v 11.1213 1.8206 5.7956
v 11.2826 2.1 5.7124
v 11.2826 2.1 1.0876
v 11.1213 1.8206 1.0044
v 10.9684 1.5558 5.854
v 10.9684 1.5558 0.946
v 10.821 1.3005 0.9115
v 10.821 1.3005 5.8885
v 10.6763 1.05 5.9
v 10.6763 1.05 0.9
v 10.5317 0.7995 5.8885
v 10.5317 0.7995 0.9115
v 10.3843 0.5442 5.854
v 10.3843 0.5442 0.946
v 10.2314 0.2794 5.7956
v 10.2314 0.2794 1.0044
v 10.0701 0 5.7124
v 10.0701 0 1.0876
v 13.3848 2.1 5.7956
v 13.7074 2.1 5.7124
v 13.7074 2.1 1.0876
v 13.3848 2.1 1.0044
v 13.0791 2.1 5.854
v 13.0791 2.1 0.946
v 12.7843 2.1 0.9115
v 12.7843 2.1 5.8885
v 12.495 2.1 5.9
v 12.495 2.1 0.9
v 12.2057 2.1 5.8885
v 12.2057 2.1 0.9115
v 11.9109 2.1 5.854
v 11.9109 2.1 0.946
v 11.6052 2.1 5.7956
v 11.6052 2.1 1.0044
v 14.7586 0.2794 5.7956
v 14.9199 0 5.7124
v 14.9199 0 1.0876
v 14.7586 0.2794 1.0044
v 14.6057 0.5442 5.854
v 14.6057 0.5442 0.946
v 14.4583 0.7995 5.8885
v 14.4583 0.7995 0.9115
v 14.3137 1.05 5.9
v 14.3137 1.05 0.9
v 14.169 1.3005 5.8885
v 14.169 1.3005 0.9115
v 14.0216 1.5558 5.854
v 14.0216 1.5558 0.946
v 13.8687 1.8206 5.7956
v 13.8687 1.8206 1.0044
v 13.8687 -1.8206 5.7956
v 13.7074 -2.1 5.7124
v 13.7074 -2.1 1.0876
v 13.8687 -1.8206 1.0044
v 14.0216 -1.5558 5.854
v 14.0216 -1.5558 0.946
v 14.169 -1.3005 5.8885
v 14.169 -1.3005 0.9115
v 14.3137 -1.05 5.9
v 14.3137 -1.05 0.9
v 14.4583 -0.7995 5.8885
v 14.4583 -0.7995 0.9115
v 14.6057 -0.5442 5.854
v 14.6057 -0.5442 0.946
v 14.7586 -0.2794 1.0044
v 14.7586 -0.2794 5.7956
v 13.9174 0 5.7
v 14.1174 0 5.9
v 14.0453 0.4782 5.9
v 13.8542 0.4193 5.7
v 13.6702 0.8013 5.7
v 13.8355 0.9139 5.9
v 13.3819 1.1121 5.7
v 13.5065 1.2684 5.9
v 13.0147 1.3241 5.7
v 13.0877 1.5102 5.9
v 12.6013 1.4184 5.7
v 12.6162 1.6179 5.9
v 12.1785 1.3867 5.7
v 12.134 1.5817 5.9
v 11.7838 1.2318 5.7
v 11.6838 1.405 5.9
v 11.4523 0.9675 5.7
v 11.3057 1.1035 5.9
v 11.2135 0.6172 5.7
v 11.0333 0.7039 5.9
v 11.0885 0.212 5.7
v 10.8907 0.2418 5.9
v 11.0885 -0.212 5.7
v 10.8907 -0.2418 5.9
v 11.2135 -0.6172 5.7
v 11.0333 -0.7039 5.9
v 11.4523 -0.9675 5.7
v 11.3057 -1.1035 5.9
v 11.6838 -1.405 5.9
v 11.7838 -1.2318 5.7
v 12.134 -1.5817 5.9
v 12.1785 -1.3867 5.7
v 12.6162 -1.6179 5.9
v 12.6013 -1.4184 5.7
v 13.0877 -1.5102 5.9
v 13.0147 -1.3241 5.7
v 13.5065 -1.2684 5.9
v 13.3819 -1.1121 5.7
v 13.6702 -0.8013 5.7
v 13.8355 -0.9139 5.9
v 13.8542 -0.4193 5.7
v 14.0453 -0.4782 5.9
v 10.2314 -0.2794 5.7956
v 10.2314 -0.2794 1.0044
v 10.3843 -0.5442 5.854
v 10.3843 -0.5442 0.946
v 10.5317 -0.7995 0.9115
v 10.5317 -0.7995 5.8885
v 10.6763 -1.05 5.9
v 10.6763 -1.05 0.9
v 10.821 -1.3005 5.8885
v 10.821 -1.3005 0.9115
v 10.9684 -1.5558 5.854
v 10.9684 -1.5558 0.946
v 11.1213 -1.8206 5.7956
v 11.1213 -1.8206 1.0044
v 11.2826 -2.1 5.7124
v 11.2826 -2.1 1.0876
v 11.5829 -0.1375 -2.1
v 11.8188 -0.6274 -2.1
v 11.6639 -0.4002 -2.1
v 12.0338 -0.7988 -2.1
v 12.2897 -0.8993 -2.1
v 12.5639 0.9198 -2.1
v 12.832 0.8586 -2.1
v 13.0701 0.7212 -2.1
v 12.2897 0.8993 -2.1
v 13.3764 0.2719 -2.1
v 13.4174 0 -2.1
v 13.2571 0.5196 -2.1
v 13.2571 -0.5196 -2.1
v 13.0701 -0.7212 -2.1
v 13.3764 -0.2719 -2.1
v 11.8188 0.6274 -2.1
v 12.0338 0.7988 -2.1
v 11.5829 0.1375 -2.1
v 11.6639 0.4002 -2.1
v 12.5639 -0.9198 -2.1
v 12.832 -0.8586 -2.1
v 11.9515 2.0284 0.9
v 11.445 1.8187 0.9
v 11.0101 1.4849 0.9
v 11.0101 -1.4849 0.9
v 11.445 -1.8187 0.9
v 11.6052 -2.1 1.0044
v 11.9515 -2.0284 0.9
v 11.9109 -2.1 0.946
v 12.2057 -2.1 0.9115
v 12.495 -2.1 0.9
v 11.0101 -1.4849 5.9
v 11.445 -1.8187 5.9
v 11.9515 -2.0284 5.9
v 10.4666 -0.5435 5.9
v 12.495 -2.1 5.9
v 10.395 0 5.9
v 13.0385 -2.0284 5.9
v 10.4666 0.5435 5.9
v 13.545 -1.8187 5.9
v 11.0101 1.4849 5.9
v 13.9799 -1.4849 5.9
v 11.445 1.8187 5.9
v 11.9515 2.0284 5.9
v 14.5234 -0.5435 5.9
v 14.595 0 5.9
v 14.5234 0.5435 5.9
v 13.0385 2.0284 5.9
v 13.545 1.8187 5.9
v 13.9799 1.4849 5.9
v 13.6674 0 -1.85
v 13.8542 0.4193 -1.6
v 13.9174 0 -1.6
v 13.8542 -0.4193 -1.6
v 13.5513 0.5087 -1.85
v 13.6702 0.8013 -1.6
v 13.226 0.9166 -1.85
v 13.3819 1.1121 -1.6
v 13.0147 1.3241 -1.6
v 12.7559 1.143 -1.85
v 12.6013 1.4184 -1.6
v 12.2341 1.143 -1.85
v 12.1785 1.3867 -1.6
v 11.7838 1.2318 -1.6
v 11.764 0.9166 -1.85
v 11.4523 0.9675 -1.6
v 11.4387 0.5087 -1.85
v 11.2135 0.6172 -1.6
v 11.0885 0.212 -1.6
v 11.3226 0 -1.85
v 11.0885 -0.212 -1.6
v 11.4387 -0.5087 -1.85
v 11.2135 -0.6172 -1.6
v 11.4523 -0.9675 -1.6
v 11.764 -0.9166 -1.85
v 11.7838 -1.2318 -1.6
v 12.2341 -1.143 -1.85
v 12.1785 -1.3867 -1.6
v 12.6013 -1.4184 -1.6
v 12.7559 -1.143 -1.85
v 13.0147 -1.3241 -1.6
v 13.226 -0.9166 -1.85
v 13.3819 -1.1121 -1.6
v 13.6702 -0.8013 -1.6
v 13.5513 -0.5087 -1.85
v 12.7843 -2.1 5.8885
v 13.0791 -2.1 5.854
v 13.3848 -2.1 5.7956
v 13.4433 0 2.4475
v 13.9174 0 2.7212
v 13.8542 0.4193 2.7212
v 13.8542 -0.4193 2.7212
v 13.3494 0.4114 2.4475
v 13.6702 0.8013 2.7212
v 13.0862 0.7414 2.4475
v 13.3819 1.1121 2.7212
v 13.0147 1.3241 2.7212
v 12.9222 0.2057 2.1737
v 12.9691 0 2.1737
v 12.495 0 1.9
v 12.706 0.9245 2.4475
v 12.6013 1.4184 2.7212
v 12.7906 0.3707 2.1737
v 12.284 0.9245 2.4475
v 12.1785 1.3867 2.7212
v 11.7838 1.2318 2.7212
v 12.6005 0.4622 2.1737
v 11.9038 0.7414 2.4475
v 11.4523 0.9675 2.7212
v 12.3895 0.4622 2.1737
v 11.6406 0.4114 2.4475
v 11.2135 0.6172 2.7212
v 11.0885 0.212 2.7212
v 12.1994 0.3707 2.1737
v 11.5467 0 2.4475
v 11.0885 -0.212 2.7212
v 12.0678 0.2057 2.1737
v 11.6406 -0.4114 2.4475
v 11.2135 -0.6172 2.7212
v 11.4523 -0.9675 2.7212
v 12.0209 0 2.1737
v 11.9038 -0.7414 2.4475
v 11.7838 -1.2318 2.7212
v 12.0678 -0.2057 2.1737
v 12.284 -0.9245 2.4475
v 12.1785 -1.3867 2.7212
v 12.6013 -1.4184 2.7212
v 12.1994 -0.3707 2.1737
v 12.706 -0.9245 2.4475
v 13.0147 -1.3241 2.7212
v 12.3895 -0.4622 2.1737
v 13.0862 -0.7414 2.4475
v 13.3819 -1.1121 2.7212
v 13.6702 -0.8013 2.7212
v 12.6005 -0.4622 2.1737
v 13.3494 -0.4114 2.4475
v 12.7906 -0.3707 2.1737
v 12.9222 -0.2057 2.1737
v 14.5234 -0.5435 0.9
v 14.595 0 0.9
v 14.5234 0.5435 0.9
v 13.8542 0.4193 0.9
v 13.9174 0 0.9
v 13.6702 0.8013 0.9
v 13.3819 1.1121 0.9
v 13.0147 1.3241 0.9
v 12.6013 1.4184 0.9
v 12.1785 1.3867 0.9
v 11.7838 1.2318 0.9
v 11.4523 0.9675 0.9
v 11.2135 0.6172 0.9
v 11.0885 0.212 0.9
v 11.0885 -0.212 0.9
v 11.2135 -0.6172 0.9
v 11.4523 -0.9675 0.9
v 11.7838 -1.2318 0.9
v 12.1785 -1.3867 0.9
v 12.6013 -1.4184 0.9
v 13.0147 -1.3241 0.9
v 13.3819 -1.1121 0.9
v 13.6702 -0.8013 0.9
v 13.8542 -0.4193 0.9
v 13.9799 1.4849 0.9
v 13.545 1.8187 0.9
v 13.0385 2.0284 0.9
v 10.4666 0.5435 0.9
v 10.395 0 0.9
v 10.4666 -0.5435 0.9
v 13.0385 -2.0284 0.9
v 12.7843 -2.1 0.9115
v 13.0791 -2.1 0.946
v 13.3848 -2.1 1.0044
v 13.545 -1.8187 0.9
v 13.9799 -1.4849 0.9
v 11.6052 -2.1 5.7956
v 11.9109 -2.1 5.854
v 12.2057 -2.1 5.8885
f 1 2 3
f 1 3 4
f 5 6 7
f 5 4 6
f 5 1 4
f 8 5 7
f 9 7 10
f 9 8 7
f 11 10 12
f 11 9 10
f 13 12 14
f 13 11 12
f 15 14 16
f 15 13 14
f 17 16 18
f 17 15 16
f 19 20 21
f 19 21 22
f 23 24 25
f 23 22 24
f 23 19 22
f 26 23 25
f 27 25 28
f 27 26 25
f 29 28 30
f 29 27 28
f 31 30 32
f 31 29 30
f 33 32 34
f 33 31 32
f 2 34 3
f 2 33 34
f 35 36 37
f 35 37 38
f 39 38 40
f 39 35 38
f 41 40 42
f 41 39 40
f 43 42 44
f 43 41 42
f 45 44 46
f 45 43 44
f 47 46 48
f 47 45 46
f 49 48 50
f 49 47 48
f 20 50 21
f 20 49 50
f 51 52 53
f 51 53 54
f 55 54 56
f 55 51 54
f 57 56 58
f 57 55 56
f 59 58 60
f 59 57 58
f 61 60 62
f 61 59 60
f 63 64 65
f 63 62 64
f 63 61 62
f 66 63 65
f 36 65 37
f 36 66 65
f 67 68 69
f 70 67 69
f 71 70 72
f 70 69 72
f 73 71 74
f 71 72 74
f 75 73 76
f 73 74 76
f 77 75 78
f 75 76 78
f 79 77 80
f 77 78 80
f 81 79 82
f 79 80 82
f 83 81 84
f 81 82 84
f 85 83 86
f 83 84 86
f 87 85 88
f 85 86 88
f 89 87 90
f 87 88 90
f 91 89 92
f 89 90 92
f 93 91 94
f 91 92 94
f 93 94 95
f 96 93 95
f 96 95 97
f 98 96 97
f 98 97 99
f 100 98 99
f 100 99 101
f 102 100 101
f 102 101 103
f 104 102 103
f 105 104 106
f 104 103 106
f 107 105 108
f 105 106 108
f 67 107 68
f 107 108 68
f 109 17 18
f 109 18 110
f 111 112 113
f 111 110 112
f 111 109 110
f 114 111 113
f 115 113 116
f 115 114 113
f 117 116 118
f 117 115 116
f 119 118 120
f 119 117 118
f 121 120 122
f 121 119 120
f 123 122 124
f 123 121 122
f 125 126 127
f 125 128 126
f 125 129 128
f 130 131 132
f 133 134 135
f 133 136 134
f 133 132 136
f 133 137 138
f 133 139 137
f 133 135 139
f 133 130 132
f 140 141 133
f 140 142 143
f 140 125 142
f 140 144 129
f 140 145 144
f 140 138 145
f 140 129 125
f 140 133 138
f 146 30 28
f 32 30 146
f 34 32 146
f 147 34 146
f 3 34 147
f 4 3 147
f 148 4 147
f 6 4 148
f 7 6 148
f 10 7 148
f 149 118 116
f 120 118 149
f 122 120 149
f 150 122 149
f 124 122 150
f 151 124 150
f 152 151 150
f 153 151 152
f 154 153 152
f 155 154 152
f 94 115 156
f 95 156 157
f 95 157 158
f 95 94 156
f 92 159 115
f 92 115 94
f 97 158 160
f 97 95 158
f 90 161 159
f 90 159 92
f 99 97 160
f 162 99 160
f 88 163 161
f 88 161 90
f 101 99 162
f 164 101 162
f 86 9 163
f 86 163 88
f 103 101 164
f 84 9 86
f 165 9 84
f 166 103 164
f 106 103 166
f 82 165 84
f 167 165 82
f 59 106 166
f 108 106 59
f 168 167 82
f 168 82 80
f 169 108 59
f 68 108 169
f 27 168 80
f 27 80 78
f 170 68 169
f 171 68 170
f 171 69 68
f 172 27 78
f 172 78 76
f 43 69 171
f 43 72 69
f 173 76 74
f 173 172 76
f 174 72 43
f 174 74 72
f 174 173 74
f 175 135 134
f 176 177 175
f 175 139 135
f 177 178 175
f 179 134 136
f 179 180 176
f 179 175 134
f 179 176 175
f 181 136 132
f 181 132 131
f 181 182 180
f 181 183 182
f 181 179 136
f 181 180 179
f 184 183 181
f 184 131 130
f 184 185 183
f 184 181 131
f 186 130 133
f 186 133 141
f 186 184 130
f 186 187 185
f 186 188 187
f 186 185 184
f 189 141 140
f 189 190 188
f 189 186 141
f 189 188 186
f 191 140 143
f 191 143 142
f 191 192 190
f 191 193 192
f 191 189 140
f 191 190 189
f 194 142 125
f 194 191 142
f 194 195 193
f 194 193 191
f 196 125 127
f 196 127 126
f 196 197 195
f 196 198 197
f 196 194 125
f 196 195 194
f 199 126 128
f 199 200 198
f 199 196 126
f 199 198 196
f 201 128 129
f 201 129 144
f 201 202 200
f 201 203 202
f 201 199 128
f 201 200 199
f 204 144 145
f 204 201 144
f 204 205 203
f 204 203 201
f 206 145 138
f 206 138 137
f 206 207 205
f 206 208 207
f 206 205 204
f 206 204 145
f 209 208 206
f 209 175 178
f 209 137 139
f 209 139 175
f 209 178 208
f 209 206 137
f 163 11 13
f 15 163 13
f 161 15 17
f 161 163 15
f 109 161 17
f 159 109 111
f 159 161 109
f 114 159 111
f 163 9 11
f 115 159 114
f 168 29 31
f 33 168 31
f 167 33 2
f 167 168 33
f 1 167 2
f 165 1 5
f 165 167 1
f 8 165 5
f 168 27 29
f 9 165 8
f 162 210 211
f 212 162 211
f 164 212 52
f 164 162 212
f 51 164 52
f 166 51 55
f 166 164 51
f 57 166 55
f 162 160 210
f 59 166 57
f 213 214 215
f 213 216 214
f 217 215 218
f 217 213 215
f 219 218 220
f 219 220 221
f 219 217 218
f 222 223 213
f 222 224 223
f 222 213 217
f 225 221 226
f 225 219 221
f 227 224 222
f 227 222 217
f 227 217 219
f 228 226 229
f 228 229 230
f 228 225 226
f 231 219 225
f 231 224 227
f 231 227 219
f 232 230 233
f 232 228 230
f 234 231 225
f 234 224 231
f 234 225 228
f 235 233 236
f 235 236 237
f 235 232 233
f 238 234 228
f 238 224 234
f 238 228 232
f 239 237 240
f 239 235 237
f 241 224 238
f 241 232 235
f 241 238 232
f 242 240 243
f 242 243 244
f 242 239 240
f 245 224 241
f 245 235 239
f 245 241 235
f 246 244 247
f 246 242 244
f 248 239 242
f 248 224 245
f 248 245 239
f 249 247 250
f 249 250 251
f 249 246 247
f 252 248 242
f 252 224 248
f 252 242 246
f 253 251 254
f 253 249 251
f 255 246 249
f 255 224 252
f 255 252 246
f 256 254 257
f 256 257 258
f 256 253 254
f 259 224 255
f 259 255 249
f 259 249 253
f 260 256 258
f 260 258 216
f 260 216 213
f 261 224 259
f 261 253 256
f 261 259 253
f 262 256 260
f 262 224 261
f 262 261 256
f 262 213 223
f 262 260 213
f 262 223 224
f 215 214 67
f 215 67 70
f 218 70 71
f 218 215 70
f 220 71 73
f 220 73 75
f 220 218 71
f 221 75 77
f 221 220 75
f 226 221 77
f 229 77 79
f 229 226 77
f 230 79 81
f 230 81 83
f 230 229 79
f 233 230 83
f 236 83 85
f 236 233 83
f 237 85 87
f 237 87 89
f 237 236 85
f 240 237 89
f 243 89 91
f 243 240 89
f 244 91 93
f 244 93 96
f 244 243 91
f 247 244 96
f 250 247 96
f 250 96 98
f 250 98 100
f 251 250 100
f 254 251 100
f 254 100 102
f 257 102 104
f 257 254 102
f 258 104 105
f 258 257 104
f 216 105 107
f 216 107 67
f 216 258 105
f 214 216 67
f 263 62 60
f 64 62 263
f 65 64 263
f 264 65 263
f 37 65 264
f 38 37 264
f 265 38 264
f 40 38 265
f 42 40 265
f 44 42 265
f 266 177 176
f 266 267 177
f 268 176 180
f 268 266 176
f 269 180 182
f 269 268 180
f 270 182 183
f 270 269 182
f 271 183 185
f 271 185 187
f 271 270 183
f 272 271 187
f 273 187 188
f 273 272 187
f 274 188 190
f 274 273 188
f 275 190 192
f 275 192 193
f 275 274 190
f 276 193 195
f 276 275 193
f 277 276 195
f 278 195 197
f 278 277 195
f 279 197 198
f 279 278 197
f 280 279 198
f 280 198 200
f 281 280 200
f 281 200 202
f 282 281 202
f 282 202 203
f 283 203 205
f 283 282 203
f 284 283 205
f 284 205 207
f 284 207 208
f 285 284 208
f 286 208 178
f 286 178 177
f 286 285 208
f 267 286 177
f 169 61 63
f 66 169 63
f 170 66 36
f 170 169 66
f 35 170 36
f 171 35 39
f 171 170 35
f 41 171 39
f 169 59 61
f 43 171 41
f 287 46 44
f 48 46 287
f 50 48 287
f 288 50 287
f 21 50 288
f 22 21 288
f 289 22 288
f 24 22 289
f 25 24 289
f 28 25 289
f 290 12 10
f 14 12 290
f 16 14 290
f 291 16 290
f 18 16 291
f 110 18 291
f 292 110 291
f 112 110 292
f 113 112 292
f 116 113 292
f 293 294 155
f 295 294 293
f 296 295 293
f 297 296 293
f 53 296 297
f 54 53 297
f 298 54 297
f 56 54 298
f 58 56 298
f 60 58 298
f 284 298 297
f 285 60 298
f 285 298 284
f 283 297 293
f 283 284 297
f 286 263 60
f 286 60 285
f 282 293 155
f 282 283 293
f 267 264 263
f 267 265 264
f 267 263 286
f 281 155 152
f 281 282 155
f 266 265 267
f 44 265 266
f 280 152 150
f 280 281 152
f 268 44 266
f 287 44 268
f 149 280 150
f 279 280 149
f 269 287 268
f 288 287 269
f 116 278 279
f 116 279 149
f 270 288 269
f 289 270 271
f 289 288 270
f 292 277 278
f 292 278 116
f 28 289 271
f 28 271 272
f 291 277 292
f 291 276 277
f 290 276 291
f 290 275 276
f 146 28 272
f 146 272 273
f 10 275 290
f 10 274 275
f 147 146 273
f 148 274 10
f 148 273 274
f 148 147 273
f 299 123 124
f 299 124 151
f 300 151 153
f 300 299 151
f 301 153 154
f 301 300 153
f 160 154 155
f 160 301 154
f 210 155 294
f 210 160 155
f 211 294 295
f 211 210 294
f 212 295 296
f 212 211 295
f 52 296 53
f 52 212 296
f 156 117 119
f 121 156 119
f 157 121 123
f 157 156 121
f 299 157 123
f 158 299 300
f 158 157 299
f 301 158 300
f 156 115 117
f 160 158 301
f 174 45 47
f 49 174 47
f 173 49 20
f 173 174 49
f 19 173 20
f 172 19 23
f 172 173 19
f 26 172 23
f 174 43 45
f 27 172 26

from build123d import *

# Parameters (mm, degrees)
SKETCH013_R     = 3.630449
POCKET007_DEPTH = 8.001
CHAMFER_SIZE    = 0.2


with BuildPart() as part:
    # Sketch012 → Revolution001 (revolve)
    with BuildSketch(Plane.XZ):
        Polygon((1.4224, 5), (1.4224, 1.821223), (0, 1), (0, -3), (0.9224, -3), (1.4224, -2.5), (1.4224, 0), (2.1, 0), (3.1, 0.57735), (3.1, 4.42265), (2.1, 5), align=None)
    revolve(axis=Axis((0, 0, 0), (0, 0, 1)))

    # Sketch013 (on Face10 of Revolution001) → Pocket007 (cut, through all)
    with BuildSketch(Plane(origin=(0, 0, 5), x_dir=(-1, 0, 0), z_dir=(0, 0, 1))):
        Circle(SKETCH013_R)
        Polygon((2.424871, 0), (1.212436, 2.1), (-1.212436, 2.1), (-2.424871, 0), (-1.212436, -2.1), (1.212436, -2.1), align=None, mode=Mode.SUBTRACT)
    extrude(amount=-POCKET007_DEPTH, mode=Mode.SUBTRACT)

    # Chamfer
    chamfer_edges = [part.edges().sort_by_distance(p)[0] for p in [
        (-1.4224, 0, 5),
    ]]
    chamfer(chamfer_edges, length=CHAMFER_SIZE)


with BuildPart() as part_1:
    # Body004 placement: moved
    add(part.part.moved(Location((-12.495, 0, 0.9))))


with BuildPart() as part_2:
    # Clone001 placement: moved
    add(part_1.part.moved(Location((12.495, 0, -0.9))))


with BuildPart() as part_3:
    # Body005 placement: moved
    add(part_2.part.moved(Location((12.495, 0, 0.9))))


solid = part_3.part
